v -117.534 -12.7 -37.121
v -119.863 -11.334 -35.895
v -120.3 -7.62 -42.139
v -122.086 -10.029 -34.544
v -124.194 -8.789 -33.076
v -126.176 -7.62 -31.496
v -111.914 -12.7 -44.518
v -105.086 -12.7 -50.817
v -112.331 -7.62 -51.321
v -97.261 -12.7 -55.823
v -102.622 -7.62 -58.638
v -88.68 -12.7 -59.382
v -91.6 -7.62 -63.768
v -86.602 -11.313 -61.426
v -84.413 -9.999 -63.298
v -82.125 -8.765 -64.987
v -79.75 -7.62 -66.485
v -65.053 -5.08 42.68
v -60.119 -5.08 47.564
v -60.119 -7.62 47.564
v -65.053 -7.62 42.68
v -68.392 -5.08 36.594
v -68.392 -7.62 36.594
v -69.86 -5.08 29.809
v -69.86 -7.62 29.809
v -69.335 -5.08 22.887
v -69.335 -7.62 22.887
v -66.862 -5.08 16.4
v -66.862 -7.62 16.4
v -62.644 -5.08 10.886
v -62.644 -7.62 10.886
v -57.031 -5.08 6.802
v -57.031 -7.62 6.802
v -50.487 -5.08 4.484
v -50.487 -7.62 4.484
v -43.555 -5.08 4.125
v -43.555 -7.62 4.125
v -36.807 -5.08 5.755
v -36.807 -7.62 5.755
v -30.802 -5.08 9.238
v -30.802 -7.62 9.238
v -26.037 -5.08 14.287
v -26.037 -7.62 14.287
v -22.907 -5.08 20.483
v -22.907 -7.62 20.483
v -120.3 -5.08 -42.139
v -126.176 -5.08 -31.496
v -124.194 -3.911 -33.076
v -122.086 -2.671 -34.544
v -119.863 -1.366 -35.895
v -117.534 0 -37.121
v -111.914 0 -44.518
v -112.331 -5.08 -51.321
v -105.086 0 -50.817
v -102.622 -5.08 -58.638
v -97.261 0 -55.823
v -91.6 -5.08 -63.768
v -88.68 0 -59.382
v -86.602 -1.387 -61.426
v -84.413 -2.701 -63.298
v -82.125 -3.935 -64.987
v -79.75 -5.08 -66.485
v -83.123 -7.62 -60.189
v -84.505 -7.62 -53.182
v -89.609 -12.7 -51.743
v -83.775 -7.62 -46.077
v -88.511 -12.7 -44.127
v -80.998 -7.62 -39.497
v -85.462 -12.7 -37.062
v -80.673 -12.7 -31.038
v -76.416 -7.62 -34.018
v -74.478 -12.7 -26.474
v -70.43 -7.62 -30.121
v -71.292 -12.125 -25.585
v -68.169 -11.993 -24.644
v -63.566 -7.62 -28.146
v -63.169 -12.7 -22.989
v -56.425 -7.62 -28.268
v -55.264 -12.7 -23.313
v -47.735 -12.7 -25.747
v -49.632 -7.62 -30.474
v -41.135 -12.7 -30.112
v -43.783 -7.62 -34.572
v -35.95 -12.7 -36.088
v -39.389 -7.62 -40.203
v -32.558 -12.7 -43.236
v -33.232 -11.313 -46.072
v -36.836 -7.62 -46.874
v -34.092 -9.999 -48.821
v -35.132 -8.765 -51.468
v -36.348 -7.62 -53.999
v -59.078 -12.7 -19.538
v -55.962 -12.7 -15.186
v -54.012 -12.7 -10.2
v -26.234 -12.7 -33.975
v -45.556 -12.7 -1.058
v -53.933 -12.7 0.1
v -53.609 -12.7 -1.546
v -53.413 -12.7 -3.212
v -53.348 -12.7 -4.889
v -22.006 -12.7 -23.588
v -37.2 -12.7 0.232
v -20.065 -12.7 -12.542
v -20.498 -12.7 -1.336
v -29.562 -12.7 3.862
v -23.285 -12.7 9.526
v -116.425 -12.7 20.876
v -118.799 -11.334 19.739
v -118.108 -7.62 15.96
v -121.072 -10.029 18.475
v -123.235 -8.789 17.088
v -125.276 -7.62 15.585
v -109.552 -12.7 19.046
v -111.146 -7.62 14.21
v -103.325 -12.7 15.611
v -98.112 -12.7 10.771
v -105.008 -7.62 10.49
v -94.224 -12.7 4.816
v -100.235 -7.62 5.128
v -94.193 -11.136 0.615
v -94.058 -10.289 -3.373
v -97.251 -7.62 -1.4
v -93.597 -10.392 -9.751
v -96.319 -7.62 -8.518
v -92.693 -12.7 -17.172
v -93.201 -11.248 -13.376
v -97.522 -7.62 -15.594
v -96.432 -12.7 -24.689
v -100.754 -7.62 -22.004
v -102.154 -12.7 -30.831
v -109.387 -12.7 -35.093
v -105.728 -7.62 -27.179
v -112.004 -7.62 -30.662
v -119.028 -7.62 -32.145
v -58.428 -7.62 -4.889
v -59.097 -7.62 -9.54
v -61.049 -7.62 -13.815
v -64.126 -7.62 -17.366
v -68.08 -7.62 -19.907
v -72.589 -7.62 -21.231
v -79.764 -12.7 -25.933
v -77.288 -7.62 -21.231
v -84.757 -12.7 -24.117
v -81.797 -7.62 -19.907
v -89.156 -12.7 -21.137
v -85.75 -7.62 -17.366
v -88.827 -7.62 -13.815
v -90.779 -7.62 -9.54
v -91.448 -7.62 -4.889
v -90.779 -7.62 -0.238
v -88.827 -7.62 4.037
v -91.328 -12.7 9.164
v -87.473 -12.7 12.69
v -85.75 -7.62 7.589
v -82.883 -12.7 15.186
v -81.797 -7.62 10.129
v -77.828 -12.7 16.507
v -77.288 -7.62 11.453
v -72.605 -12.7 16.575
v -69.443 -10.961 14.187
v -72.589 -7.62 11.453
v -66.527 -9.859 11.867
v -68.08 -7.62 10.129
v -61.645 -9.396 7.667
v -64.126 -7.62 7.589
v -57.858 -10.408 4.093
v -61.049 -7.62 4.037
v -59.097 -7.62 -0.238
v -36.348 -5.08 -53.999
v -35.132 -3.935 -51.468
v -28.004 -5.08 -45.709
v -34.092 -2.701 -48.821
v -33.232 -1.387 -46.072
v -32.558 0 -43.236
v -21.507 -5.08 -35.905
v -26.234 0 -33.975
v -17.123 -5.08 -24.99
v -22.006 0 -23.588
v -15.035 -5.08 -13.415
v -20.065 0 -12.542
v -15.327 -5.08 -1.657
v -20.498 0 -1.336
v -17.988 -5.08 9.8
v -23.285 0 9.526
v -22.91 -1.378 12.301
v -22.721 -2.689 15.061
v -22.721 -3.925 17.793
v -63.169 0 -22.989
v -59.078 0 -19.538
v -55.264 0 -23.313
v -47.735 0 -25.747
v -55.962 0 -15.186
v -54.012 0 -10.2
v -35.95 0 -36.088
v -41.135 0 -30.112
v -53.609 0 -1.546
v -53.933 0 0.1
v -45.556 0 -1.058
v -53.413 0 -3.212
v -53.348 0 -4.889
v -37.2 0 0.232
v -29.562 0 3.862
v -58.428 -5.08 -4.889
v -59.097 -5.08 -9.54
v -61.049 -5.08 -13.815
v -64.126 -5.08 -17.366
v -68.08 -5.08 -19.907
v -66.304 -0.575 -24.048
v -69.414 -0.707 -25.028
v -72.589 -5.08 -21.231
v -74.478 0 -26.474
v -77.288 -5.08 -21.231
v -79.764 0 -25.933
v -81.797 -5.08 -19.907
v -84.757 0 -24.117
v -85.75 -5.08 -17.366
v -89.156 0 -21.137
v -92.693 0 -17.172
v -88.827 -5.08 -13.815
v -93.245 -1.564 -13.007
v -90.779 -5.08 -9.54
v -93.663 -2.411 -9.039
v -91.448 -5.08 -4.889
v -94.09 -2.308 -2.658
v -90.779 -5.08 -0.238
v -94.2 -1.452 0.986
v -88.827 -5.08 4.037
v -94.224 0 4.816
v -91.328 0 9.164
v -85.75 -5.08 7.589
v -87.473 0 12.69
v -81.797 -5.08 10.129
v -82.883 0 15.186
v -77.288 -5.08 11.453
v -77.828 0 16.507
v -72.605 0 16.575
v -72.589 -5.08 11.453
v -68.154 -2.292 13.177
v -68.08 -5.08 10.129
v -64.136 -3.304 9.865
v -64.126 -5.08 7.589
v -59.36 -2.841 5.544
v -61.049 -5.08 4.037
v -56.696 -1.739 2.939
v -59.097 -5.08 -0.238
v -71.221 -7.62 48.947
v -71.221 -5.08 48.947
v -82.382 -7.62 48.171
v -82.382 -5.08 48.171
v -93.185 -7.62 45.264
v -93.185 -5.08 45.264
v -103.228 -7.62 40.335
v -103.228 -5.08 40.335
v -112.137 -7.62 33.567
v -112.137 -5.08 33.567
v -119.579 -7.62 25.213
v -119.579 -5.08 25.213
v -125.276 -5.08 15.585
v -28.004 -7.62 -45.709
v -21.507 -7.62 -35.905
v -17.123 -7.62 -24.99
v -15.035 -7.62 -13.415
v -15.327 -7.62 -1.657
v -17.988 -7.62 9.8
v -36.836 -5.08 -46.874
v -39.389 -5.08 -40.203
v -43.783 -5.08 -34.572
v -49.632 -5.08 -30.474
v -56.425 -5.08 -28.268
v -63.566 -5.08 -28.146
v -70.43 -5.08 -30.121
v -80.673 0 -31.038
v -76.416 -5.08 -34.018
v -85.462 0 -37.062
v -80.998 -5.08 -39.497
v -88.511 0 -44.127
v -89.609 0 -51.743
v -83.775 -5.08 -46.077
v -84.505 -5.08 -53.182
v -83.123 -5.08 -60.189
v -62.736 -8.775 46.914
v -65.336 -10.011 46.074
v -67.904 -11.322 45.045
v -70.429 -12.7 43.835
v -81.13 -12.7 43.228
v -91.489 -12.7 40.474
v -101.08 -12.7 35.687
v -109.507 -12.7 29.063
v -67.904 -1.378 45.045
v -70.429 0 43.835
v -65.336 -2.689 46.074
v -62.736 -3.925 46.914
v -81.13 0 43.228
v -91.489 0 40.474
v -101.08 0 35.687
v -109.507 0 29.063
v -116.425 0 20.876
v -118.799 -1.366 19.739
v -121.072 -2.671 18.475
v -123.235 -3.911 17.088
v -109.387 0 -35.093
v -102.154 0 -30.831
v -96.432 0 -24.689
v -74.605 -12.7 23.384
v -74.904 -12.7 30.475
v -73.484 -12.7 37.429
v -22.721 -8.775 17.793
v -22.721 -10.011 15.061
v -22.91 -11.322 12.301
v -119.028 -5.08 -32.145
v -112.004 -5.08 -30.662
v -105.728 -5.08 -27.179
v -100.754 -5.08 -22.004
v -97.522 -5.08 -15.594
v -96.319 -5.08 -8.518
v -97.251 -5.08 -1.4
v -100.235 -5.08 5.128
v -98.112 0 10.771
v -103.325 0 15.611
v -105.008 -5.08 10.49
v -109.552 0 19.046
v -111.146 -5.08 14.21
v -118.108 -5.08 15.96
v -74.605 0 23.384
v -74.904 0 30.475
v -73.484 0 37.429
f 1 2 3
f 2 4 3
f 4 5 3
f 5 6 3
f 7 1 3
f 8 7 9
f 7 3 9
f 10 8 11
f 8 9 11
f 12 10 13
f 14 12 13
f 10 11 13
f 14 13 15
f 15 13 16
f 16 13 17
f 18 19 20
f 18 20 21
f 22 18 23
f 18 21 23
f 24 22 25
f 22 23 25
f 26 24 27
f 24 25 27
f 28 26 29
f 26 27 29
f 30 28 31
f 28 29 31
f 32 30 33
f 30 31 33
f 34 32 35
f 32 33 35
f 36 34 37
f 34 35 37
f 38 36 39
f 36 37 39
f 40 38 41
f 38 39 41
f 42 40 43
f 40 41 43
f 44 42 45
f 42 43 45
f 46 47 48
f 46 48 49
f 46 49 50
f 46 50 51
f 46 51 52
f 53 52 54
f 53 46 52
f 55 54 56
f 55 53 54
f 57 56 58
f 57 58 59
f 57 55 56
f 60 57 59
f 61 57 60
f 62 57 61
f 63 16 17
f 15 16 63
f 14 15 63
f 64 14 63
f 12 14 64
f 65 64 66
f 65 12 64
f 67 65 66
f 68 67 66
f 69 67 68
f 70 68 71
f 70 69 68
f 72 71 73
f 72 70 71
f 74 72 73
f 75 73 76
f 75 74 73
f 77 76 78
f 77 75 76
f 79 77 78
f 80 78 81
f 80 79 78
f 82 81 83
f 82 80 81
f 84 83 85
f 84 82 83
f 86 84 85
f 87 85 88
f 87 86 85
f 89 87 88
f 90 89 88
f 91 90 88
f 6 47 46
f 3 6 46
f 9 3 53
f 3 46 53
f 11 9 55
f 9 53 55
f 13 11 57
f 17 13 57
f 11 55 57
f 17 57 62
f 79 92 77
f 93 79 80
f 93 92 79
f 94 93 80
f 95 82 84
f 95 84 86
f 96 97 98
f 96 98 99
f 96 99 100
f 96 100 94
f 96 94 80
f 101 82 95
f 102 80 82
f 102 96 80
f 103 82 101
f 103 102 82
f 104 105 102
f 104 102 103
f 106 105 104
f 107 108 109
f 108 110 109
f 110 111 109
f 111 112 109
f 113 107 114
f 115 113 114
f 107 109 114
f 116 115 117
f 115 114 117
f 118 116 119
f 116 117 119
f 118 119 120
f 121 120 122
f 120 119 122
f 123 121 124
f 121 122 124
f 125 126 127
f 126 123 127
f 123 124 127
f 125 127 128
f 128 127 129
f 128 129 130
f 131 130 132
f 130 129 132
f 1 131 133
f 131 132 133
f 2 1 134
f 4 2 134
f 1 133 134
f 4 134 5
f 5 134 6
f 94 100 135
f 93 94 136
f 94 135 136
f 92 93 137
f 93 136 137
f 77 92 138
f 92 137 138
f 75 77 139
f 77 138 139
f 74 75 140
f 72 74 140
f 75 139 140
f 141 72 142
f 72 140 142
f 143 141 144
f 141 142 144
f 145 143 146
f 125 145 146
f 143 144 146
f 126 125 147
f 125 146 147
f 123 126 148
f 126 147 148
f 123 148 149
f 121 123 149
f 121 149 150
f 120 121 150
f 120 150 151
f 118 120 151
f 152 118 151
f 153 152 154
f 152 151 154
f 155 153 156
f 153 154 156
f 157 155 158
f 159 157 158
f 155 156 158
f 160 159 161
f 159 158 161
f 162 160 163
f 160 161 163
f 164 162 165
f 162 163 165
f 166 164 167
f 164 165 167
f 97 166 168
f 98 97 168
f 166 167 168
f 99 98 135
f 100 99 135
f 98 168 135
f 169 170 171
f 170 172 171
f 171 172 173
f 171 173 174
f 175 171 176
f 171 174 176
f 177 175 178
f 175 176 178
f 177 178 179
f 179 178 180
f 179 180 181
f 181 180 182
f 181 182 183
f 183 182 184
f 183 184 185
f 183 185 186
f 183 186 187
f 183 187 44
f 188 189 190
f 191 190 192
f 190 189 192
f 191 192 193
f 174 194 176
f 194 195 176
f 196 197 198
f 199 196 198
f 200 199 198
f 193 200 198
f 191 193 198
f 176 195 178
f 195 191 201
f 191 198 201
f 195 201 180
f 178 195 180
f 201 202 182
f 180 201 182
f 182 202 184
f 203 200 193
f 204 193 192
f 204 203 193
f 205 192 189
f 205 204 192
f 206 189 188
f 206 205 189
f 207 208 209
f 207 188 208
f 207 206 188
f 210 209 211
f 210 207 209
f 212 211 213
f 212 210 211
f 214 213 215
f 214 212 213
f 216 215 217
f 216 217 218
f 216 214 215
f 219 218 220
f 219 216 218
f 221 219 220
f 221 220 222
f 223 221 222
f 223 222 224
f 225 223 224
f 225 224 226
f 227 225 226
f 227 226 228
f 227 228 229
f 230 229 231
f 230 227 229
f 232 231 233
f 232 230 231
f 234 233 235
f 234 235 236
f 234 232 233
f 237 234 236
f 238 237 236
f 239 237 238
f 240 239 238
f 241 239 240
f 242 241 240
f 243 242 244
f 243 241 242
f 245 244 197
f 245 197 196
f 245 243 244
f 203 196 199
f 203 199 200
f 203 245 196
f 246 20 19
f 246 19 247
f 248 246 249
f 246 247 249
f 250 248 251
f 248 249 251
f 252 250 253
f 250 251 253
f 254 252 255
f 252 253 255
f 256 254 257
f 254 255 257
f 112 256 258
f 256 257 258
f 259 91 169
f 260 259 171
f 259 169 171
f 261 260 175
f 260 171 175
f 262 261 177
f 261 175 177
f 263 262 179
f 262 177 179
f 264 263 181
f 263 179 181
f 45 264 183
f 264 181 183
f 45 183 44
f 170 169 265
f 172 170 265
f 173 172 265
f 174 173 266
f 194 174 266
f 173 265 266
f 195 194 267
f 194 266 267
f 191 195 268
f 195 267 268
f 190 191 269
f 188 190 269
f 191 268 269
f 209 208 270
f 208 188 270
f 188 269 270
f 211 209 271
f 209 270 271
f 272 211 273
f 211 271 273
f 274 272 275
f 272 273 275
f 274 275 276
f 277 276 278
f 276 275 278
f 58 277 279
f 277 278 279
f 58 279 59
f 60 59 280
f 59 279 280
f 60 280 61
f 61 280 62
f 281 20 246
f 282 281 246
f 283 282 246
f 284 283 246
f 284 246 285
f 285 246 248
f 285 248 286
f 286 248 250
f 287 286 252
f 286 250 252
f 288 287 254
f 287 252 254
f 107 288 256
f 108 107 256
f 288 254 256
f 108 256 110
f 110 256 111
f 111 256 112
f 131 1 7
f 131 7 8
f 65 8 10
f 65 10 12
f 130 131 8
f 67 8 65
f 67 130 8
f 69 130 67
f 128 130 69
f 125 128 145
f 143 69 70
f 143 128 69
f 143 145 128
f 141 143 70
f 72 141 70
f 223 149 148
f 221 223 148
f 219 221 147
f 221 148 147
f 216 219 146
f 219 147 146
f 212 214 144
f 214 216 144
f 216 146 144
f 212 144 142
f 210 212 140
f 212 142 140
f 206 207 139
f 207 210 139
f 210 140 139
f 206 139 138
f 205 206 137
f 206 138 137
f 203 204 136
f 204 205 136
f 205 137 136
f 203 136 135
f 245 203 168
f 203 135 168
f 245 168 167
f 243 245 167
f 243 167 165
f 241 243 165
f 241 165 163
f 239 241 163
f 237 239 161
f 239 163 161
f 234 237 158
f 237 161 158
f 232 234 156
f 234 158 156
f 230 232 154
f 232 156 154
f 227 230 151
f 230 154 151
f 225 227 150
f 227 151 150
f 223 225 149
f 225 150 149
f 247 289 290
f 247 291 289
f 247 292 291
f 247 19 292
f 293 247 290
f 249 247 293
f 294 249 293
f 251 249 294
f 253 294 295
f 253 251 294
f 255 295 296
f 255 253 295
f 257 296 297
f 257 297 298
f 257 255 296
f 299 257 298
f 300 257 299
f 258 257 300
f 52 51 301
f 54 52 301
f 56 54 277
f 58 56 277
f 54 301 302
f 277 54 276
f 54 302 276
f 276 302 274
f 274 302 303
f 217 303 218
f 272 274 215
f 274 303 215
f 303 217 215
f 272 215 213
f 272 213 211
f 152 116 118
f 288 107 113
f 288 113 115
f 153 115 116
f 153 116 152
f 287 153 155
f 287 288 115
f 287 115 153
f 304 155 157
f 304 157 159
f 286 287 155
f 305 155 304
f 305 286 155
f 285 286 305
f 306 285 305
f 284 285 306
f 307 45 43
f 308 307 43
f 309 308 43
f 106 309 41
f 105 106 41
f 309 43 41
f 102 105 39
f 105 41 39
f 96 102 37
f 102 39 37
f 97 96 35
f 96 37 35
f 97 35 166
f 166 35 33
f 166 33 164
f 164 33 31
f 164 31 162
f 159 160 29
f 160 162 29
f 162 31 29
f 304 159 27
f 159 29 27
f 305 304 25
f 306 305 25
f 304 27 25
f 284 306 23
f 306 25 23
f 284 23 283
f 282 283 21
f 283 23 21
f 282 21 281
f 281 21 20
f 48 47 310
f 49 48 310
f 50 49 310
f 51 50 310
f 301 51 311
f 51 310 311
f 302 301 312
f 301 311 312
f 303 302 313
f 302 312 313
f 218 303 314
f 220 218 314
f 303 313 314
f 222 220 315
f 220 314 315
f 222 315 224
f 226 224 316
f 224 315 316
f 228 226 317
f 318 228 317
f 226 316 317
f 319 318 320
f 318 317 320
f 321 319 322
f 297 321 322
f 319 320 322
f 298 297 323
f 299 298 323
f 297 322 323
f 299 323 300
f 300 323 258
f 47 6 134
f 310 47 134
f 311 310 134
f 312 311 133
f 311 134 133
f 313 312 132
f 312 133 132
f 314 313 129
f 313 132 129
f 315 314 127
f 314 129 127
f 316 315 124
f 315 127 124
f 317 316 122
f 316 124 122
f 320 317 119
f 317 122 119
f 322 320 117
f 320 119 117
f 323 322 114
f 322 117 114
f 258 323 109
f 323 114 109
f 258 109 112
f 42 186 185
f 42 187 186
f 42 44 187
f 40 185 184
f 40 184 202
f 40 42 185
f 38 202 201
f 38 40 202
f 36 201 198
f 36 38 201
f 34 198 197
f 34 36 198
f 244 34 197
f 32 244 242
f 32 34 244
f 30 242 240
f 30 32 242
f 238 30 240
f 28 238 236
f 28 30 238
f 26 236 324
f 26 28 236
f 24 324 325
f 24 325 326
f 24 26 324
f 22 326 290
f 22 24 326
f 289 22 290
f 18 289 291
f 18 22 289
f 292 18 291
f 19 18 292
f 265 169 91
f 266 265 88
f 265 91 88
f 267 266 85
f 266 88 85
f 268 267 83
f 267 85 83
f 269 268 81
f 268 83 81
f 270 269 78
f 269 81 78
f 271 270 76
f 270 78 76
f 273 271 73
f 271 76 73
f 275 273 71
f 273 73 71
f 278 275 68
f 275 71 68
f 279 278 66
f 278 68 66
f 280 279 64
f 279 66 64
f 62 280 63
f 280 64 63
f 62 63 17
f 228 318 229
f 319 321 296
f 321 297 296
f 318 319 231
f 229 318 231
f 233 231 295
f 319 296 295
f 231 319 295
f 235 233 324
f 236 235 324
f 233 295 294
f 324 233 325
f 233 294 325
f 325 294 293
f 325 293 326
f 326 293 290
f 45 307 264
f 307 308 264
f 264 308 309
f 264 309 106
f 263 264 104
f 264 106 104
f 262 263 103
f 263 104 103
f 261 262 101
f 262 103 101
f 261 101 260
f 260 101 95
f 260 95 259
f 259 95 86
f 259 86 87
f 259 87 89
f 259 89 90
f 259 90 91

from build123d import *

# Parameters (mm, degrees)
F0_R         = 57.9360533335
F2_DEPTH     = 12.7
F3_D         = 48.26
F5_D         = 33.02
F6_T2_ANGLE  = 283.4727948919
F6_T4_ANGLE  = 86.0712547595
F6_T6_ANGLE  = 107.4118170834
F6_T8_ANGLE  = 267.462303274
F6_T10_ANGLE = 277.2145700269
F6_T12_ANGLE = 103.4165555336
F6_T16_ANGLE = 107.4118170834
F6_T18_ANGLE = 283.4727948919
F6_T20_ANGLE = 277.2145700269
F6_T22_ANGLE = 86.0712547595
F6_T24_ANGLE = 103.4165555336
F6_T26_ANGLE = 267.462303274


# Not quite as in the source:
# - a fillet or chamfer that OpenCascade refuses, or shapes differently, is made with other operations: its cross-section is extruded or revolved along the edge and cut away or added


with BuildPart() as f2:
    # F0 (on Front) → F2 (new body)
    with BuildSketch(Plane.XZ):
        with Locations((-72.7998018265, -8.9674890041)):
            Circle(F0_R)
    extrude(amount=F2_DEPTH)

    # F3 (through all)
    with Locations(Plane(origin=(0, 0, 0), x_dir=(1, 0, 0), z_dir=(0, 1, 0))):
        with Locations((-45.7866154611, -28.1515028328), (-120.4445809126, 8.0565353855), (-60.4006908834, 52.0677864552)):
            Hole(F3_D / 2)

    # F5 (through all)
    with Locations(Plane(origin=(0, 0, 0), x_dir=(1, 0, 0), z_dir=(0, 1, 0))):
        with Locations((-74.9381706119, 4.8889117315)):
            Hole(F5_D / 2)

    # F6: chamfer of 5.08 on 14 edges, made by hand

    # F6_s1 → F6_t2 (revolve, cut)
    with BuildSketch(Plane(origin=(-33.5431340109, 0, 13.6983383479), x_dir=(0, 1, 0), z_dir=(0.9257774909, 0, -0.3780688263))):
        Polygon((-7.62, -95.1688030077), (-12.7, -100.2488030077), (-12.7, -95.1688030077), align=None)
    revolve(axis=Axis((-60.4006908834, -12.7, -52.0677864552), (0, 1, 0)), revolution_arc=F6_T2_ANGLE, mode=Mode.SUBTRACT)

    # F6_s3 → F6_t4 (revolve, cut)
    with BuildSketch(Plane(origin=(-0.6504253771, 0, 3.7035474889), x_dir=(0, 1, 0), z_dir=(-0.1729749681, 0, 0.9849262208))):
        Polygon((-12.7, 126.1096381457), (-7.62, 131.1896381457), (-12.7, 131.1896381457), align=None)
    revolve(axis=Axis((-72.7998018265, -12.7, -8.9674890041), (0, -1, 0)), revolution_arc=F6_T4_ANGLE, mode=Mode.SUBTRACT)

    # F6_s5 → F6_t6 (revolve, cut)
    with BuildSketch(Plane(origin=(-29.9879926822, 0, 31.6264228209), x_dir=(0, 1, 0), z_dir=(-0.6880604052, 0, 0.7256534151))):
        Polygon((-7.62, 1.0615455961), (-12.7, 6.1415455961), (-12.7, 1.0615455961), align=None)
    revolve(axis=Axis((-72.7998018265, -12.7, -8.9674890041), (0, 1, 0)), revolution_arc=F6_T6_ANGLE, mode=Mode.SUBTRACT)

    # F6_s7 → F6_t8 (revolve, cut)
    with BuildSketch(Plane(origin=(-69.201107614, 0, -63.7135426846), x_dir=(0, 1, 0), z_dir=(-0.7356739262, 0, -0.6773358652))):
        Polygon((-12.7, -104.8644514037), (-7.62, -99.7844514037), (-12.7, -99.7844514037), align=None)
    revolve(axis=Axis((-120.4445809126, -12.7, -8.0565353855), (0, 1, 0)), revolution_arc=F6_T8_ANGLE, mode=Mode.SUBTRACT)

    # F6_s9 → F6_t10 (revolve, cut)
    with BuildSketch(Plane(origin=(-8.1423267798, 0, 36.5399201696), x_dir=(0, 1, 0), z_dir=(-0.2174992035, 0, 0.9760604984))):
        Polygon((-12.7, 9.3575772605), (-7.62, 14.4375772605), (-12.7, 14.4375772605), align=None)
    revolve(axis=Axis((-45.7866154611, -12.7, 28.1515028328), (0, 1, 0)), revolution_arc=F6_T10_ANGLE, mode=Mode.SUBTRACT)

    # F6_s11 → F6_t12 (revolve, cut)
    with BuildSketch(Plane(origin=(-55.7502574842, 0, 26.6710376642), x_dir=(0, 1, 0), z_dir=(0.9020846433, 0, -0.4315591458))):
        Polygon((-12.7, 13.3491989235), (-7.62, 18.4291989235), (-12.7, 18.4291989235), align=None)
    revolve(axis=Axis((-72.7998018265, -12.7, -8.9674890041), (0, -1, 0)), revolution_arc=F6_T12_ANGLE, mode=Mode.SUBTRACT)

    # F6_s13 → F6_t14 (revolve, cut)
    with BuildSketch(Plane.XY.offset(-4.8889117315)):
        Polygon((-53.3481706119, -12.7), (-58.4281706119, -7.62), (-58.4281706119, -12.7), align=None)
    revolve(axis=Axis((-74.9381706119, -12.7, -4.8889117315), (0, 1, 0)), mode=Mode.SUBTRACT)

    # F6_s15 → F6_t16 (revolve, cut)
    with BuildSketch(Plane(origin=(-62.2843162467, 0, -30.4655418629), x_dir=(0, 1, 0), z_dir=(-0.8982965238, 0, -0.4393897533))):
        Polygon((-5.08, 34.004030567), (0, 28.924030567), (0, 34.004030567), align=None)
    revolve(axis=Axis((-72.7998018265, 0, -8.9674890041), (0, -1, 0)), revolution_arc=F6_T16_ANGLE, mode=Mode.SUBTRACT)

    # F6_s17 → F6_t18 (revolve, cut)
    with BuildSketch(Plane(origin=(-45.2248879791, 0, -62.9674495541), x_dir=(0, 1, 0), z_dir=(-0.5833556277, 0, -0.8122168501))):
        Polygon((0, 10.5255773581), (-5.08, 5.4455773581), (0, 5.4455773581), align=None)
    revolve(axis=Axis((-60.4006908834, 0, -52.0677864552), (0, -1, 0)), revolution_arc=F6_T18_ANGLE, mode=Mode.SUBTRACT)

    # F6_s19 → F6_t20 (revolve, cut)
    with BuildSketch(Plane(origin=(-8.1423267798, 0, 36.5399201696), x_dir=(0, 1, 0), z_dir=(-0.2174992035, 0, 0.9760604984))):
        Polygon((0, 9.3575772605), (-5.08, 14.4375772605), (0, 14.4375772605), align=None)
    revolve(axis=Axis((-45.7866154611, 0, 28.1515028328), (0, 1, 0)), revolution_arc=F6_T20_ANGLE, mode=Mode.SUBTRACT)

    # F6_s21 → F6_t22 (revolve, cut)
    with BuildSketch(Plane(origin=(-0.6504253771, 0, 3.7035474889), x_dir=(0, 1, 0), z_dir=(-0.1729749681, 0, 0.9849262208))):
        Polygon((0, 126.1096381457), (-5.08, 131.1896381457), (0, 131.1896381457), align=None)
    revolve(axis=Axis((-72.7998018265, 0, -8.9674890041), (0, -1, 0)), revolution_arc=F6_T22_ANGLE, mode=Mode.SUBTRACT)

    # F6_s23 → F6_t24 (revolve, cut)
    with BuildSketch(Plane(origin=(-55.7502574842, 0, 26.6710376642), x_dir=(0, 1, 0), z_dir=(0.9020846433, 0, -0.4315591458))):
        Polygon((0, 13.3491989235), (-5.08, 18.4291989235), (0, 18.4291989235), align=None)
    revolve(axis=Axis((-72.7998018265, 0, -8.9674890041), (0, -1, 0)), revolution_arc=F6_T24_ANGLE, mode=Mode.SUBTRACT)

    # F6_s25 → F6_t26 (revolve, cut)
    with BuildSketch(Plane(origin=(-56.5588266789, 0, 56.2173150628), x_dir=(0, 1, 0), z_dir=(-0.7092448082, 0, 0.7049622699))):
        Polygon((0, 119.832941055), (-5.08, 114.752941055), (0, 114.752941055), align=None)
    revolve(axis=Axis((-120.4445809126, 0, -8.0565353855), (0, -1, 0)), revolution_arc=F6_T26_ANGLE, mode=Mode.SUBTRACT)

    # F6_s27 → F6_t28 (revolve, cut)
    with BuildSketch(Plane.XY.offset(-4.8889117315)):
        Polygon((-53.3481706119, 0), (-58.4281706119, -5.08), (-58.4281706119, 0), align=None)
    revolve(axis=Axis((-74.9381706119, 0, -4.8889117315), (0, 1, 0)), mode=Mode.SUBTRACT)


solid = f2.part
